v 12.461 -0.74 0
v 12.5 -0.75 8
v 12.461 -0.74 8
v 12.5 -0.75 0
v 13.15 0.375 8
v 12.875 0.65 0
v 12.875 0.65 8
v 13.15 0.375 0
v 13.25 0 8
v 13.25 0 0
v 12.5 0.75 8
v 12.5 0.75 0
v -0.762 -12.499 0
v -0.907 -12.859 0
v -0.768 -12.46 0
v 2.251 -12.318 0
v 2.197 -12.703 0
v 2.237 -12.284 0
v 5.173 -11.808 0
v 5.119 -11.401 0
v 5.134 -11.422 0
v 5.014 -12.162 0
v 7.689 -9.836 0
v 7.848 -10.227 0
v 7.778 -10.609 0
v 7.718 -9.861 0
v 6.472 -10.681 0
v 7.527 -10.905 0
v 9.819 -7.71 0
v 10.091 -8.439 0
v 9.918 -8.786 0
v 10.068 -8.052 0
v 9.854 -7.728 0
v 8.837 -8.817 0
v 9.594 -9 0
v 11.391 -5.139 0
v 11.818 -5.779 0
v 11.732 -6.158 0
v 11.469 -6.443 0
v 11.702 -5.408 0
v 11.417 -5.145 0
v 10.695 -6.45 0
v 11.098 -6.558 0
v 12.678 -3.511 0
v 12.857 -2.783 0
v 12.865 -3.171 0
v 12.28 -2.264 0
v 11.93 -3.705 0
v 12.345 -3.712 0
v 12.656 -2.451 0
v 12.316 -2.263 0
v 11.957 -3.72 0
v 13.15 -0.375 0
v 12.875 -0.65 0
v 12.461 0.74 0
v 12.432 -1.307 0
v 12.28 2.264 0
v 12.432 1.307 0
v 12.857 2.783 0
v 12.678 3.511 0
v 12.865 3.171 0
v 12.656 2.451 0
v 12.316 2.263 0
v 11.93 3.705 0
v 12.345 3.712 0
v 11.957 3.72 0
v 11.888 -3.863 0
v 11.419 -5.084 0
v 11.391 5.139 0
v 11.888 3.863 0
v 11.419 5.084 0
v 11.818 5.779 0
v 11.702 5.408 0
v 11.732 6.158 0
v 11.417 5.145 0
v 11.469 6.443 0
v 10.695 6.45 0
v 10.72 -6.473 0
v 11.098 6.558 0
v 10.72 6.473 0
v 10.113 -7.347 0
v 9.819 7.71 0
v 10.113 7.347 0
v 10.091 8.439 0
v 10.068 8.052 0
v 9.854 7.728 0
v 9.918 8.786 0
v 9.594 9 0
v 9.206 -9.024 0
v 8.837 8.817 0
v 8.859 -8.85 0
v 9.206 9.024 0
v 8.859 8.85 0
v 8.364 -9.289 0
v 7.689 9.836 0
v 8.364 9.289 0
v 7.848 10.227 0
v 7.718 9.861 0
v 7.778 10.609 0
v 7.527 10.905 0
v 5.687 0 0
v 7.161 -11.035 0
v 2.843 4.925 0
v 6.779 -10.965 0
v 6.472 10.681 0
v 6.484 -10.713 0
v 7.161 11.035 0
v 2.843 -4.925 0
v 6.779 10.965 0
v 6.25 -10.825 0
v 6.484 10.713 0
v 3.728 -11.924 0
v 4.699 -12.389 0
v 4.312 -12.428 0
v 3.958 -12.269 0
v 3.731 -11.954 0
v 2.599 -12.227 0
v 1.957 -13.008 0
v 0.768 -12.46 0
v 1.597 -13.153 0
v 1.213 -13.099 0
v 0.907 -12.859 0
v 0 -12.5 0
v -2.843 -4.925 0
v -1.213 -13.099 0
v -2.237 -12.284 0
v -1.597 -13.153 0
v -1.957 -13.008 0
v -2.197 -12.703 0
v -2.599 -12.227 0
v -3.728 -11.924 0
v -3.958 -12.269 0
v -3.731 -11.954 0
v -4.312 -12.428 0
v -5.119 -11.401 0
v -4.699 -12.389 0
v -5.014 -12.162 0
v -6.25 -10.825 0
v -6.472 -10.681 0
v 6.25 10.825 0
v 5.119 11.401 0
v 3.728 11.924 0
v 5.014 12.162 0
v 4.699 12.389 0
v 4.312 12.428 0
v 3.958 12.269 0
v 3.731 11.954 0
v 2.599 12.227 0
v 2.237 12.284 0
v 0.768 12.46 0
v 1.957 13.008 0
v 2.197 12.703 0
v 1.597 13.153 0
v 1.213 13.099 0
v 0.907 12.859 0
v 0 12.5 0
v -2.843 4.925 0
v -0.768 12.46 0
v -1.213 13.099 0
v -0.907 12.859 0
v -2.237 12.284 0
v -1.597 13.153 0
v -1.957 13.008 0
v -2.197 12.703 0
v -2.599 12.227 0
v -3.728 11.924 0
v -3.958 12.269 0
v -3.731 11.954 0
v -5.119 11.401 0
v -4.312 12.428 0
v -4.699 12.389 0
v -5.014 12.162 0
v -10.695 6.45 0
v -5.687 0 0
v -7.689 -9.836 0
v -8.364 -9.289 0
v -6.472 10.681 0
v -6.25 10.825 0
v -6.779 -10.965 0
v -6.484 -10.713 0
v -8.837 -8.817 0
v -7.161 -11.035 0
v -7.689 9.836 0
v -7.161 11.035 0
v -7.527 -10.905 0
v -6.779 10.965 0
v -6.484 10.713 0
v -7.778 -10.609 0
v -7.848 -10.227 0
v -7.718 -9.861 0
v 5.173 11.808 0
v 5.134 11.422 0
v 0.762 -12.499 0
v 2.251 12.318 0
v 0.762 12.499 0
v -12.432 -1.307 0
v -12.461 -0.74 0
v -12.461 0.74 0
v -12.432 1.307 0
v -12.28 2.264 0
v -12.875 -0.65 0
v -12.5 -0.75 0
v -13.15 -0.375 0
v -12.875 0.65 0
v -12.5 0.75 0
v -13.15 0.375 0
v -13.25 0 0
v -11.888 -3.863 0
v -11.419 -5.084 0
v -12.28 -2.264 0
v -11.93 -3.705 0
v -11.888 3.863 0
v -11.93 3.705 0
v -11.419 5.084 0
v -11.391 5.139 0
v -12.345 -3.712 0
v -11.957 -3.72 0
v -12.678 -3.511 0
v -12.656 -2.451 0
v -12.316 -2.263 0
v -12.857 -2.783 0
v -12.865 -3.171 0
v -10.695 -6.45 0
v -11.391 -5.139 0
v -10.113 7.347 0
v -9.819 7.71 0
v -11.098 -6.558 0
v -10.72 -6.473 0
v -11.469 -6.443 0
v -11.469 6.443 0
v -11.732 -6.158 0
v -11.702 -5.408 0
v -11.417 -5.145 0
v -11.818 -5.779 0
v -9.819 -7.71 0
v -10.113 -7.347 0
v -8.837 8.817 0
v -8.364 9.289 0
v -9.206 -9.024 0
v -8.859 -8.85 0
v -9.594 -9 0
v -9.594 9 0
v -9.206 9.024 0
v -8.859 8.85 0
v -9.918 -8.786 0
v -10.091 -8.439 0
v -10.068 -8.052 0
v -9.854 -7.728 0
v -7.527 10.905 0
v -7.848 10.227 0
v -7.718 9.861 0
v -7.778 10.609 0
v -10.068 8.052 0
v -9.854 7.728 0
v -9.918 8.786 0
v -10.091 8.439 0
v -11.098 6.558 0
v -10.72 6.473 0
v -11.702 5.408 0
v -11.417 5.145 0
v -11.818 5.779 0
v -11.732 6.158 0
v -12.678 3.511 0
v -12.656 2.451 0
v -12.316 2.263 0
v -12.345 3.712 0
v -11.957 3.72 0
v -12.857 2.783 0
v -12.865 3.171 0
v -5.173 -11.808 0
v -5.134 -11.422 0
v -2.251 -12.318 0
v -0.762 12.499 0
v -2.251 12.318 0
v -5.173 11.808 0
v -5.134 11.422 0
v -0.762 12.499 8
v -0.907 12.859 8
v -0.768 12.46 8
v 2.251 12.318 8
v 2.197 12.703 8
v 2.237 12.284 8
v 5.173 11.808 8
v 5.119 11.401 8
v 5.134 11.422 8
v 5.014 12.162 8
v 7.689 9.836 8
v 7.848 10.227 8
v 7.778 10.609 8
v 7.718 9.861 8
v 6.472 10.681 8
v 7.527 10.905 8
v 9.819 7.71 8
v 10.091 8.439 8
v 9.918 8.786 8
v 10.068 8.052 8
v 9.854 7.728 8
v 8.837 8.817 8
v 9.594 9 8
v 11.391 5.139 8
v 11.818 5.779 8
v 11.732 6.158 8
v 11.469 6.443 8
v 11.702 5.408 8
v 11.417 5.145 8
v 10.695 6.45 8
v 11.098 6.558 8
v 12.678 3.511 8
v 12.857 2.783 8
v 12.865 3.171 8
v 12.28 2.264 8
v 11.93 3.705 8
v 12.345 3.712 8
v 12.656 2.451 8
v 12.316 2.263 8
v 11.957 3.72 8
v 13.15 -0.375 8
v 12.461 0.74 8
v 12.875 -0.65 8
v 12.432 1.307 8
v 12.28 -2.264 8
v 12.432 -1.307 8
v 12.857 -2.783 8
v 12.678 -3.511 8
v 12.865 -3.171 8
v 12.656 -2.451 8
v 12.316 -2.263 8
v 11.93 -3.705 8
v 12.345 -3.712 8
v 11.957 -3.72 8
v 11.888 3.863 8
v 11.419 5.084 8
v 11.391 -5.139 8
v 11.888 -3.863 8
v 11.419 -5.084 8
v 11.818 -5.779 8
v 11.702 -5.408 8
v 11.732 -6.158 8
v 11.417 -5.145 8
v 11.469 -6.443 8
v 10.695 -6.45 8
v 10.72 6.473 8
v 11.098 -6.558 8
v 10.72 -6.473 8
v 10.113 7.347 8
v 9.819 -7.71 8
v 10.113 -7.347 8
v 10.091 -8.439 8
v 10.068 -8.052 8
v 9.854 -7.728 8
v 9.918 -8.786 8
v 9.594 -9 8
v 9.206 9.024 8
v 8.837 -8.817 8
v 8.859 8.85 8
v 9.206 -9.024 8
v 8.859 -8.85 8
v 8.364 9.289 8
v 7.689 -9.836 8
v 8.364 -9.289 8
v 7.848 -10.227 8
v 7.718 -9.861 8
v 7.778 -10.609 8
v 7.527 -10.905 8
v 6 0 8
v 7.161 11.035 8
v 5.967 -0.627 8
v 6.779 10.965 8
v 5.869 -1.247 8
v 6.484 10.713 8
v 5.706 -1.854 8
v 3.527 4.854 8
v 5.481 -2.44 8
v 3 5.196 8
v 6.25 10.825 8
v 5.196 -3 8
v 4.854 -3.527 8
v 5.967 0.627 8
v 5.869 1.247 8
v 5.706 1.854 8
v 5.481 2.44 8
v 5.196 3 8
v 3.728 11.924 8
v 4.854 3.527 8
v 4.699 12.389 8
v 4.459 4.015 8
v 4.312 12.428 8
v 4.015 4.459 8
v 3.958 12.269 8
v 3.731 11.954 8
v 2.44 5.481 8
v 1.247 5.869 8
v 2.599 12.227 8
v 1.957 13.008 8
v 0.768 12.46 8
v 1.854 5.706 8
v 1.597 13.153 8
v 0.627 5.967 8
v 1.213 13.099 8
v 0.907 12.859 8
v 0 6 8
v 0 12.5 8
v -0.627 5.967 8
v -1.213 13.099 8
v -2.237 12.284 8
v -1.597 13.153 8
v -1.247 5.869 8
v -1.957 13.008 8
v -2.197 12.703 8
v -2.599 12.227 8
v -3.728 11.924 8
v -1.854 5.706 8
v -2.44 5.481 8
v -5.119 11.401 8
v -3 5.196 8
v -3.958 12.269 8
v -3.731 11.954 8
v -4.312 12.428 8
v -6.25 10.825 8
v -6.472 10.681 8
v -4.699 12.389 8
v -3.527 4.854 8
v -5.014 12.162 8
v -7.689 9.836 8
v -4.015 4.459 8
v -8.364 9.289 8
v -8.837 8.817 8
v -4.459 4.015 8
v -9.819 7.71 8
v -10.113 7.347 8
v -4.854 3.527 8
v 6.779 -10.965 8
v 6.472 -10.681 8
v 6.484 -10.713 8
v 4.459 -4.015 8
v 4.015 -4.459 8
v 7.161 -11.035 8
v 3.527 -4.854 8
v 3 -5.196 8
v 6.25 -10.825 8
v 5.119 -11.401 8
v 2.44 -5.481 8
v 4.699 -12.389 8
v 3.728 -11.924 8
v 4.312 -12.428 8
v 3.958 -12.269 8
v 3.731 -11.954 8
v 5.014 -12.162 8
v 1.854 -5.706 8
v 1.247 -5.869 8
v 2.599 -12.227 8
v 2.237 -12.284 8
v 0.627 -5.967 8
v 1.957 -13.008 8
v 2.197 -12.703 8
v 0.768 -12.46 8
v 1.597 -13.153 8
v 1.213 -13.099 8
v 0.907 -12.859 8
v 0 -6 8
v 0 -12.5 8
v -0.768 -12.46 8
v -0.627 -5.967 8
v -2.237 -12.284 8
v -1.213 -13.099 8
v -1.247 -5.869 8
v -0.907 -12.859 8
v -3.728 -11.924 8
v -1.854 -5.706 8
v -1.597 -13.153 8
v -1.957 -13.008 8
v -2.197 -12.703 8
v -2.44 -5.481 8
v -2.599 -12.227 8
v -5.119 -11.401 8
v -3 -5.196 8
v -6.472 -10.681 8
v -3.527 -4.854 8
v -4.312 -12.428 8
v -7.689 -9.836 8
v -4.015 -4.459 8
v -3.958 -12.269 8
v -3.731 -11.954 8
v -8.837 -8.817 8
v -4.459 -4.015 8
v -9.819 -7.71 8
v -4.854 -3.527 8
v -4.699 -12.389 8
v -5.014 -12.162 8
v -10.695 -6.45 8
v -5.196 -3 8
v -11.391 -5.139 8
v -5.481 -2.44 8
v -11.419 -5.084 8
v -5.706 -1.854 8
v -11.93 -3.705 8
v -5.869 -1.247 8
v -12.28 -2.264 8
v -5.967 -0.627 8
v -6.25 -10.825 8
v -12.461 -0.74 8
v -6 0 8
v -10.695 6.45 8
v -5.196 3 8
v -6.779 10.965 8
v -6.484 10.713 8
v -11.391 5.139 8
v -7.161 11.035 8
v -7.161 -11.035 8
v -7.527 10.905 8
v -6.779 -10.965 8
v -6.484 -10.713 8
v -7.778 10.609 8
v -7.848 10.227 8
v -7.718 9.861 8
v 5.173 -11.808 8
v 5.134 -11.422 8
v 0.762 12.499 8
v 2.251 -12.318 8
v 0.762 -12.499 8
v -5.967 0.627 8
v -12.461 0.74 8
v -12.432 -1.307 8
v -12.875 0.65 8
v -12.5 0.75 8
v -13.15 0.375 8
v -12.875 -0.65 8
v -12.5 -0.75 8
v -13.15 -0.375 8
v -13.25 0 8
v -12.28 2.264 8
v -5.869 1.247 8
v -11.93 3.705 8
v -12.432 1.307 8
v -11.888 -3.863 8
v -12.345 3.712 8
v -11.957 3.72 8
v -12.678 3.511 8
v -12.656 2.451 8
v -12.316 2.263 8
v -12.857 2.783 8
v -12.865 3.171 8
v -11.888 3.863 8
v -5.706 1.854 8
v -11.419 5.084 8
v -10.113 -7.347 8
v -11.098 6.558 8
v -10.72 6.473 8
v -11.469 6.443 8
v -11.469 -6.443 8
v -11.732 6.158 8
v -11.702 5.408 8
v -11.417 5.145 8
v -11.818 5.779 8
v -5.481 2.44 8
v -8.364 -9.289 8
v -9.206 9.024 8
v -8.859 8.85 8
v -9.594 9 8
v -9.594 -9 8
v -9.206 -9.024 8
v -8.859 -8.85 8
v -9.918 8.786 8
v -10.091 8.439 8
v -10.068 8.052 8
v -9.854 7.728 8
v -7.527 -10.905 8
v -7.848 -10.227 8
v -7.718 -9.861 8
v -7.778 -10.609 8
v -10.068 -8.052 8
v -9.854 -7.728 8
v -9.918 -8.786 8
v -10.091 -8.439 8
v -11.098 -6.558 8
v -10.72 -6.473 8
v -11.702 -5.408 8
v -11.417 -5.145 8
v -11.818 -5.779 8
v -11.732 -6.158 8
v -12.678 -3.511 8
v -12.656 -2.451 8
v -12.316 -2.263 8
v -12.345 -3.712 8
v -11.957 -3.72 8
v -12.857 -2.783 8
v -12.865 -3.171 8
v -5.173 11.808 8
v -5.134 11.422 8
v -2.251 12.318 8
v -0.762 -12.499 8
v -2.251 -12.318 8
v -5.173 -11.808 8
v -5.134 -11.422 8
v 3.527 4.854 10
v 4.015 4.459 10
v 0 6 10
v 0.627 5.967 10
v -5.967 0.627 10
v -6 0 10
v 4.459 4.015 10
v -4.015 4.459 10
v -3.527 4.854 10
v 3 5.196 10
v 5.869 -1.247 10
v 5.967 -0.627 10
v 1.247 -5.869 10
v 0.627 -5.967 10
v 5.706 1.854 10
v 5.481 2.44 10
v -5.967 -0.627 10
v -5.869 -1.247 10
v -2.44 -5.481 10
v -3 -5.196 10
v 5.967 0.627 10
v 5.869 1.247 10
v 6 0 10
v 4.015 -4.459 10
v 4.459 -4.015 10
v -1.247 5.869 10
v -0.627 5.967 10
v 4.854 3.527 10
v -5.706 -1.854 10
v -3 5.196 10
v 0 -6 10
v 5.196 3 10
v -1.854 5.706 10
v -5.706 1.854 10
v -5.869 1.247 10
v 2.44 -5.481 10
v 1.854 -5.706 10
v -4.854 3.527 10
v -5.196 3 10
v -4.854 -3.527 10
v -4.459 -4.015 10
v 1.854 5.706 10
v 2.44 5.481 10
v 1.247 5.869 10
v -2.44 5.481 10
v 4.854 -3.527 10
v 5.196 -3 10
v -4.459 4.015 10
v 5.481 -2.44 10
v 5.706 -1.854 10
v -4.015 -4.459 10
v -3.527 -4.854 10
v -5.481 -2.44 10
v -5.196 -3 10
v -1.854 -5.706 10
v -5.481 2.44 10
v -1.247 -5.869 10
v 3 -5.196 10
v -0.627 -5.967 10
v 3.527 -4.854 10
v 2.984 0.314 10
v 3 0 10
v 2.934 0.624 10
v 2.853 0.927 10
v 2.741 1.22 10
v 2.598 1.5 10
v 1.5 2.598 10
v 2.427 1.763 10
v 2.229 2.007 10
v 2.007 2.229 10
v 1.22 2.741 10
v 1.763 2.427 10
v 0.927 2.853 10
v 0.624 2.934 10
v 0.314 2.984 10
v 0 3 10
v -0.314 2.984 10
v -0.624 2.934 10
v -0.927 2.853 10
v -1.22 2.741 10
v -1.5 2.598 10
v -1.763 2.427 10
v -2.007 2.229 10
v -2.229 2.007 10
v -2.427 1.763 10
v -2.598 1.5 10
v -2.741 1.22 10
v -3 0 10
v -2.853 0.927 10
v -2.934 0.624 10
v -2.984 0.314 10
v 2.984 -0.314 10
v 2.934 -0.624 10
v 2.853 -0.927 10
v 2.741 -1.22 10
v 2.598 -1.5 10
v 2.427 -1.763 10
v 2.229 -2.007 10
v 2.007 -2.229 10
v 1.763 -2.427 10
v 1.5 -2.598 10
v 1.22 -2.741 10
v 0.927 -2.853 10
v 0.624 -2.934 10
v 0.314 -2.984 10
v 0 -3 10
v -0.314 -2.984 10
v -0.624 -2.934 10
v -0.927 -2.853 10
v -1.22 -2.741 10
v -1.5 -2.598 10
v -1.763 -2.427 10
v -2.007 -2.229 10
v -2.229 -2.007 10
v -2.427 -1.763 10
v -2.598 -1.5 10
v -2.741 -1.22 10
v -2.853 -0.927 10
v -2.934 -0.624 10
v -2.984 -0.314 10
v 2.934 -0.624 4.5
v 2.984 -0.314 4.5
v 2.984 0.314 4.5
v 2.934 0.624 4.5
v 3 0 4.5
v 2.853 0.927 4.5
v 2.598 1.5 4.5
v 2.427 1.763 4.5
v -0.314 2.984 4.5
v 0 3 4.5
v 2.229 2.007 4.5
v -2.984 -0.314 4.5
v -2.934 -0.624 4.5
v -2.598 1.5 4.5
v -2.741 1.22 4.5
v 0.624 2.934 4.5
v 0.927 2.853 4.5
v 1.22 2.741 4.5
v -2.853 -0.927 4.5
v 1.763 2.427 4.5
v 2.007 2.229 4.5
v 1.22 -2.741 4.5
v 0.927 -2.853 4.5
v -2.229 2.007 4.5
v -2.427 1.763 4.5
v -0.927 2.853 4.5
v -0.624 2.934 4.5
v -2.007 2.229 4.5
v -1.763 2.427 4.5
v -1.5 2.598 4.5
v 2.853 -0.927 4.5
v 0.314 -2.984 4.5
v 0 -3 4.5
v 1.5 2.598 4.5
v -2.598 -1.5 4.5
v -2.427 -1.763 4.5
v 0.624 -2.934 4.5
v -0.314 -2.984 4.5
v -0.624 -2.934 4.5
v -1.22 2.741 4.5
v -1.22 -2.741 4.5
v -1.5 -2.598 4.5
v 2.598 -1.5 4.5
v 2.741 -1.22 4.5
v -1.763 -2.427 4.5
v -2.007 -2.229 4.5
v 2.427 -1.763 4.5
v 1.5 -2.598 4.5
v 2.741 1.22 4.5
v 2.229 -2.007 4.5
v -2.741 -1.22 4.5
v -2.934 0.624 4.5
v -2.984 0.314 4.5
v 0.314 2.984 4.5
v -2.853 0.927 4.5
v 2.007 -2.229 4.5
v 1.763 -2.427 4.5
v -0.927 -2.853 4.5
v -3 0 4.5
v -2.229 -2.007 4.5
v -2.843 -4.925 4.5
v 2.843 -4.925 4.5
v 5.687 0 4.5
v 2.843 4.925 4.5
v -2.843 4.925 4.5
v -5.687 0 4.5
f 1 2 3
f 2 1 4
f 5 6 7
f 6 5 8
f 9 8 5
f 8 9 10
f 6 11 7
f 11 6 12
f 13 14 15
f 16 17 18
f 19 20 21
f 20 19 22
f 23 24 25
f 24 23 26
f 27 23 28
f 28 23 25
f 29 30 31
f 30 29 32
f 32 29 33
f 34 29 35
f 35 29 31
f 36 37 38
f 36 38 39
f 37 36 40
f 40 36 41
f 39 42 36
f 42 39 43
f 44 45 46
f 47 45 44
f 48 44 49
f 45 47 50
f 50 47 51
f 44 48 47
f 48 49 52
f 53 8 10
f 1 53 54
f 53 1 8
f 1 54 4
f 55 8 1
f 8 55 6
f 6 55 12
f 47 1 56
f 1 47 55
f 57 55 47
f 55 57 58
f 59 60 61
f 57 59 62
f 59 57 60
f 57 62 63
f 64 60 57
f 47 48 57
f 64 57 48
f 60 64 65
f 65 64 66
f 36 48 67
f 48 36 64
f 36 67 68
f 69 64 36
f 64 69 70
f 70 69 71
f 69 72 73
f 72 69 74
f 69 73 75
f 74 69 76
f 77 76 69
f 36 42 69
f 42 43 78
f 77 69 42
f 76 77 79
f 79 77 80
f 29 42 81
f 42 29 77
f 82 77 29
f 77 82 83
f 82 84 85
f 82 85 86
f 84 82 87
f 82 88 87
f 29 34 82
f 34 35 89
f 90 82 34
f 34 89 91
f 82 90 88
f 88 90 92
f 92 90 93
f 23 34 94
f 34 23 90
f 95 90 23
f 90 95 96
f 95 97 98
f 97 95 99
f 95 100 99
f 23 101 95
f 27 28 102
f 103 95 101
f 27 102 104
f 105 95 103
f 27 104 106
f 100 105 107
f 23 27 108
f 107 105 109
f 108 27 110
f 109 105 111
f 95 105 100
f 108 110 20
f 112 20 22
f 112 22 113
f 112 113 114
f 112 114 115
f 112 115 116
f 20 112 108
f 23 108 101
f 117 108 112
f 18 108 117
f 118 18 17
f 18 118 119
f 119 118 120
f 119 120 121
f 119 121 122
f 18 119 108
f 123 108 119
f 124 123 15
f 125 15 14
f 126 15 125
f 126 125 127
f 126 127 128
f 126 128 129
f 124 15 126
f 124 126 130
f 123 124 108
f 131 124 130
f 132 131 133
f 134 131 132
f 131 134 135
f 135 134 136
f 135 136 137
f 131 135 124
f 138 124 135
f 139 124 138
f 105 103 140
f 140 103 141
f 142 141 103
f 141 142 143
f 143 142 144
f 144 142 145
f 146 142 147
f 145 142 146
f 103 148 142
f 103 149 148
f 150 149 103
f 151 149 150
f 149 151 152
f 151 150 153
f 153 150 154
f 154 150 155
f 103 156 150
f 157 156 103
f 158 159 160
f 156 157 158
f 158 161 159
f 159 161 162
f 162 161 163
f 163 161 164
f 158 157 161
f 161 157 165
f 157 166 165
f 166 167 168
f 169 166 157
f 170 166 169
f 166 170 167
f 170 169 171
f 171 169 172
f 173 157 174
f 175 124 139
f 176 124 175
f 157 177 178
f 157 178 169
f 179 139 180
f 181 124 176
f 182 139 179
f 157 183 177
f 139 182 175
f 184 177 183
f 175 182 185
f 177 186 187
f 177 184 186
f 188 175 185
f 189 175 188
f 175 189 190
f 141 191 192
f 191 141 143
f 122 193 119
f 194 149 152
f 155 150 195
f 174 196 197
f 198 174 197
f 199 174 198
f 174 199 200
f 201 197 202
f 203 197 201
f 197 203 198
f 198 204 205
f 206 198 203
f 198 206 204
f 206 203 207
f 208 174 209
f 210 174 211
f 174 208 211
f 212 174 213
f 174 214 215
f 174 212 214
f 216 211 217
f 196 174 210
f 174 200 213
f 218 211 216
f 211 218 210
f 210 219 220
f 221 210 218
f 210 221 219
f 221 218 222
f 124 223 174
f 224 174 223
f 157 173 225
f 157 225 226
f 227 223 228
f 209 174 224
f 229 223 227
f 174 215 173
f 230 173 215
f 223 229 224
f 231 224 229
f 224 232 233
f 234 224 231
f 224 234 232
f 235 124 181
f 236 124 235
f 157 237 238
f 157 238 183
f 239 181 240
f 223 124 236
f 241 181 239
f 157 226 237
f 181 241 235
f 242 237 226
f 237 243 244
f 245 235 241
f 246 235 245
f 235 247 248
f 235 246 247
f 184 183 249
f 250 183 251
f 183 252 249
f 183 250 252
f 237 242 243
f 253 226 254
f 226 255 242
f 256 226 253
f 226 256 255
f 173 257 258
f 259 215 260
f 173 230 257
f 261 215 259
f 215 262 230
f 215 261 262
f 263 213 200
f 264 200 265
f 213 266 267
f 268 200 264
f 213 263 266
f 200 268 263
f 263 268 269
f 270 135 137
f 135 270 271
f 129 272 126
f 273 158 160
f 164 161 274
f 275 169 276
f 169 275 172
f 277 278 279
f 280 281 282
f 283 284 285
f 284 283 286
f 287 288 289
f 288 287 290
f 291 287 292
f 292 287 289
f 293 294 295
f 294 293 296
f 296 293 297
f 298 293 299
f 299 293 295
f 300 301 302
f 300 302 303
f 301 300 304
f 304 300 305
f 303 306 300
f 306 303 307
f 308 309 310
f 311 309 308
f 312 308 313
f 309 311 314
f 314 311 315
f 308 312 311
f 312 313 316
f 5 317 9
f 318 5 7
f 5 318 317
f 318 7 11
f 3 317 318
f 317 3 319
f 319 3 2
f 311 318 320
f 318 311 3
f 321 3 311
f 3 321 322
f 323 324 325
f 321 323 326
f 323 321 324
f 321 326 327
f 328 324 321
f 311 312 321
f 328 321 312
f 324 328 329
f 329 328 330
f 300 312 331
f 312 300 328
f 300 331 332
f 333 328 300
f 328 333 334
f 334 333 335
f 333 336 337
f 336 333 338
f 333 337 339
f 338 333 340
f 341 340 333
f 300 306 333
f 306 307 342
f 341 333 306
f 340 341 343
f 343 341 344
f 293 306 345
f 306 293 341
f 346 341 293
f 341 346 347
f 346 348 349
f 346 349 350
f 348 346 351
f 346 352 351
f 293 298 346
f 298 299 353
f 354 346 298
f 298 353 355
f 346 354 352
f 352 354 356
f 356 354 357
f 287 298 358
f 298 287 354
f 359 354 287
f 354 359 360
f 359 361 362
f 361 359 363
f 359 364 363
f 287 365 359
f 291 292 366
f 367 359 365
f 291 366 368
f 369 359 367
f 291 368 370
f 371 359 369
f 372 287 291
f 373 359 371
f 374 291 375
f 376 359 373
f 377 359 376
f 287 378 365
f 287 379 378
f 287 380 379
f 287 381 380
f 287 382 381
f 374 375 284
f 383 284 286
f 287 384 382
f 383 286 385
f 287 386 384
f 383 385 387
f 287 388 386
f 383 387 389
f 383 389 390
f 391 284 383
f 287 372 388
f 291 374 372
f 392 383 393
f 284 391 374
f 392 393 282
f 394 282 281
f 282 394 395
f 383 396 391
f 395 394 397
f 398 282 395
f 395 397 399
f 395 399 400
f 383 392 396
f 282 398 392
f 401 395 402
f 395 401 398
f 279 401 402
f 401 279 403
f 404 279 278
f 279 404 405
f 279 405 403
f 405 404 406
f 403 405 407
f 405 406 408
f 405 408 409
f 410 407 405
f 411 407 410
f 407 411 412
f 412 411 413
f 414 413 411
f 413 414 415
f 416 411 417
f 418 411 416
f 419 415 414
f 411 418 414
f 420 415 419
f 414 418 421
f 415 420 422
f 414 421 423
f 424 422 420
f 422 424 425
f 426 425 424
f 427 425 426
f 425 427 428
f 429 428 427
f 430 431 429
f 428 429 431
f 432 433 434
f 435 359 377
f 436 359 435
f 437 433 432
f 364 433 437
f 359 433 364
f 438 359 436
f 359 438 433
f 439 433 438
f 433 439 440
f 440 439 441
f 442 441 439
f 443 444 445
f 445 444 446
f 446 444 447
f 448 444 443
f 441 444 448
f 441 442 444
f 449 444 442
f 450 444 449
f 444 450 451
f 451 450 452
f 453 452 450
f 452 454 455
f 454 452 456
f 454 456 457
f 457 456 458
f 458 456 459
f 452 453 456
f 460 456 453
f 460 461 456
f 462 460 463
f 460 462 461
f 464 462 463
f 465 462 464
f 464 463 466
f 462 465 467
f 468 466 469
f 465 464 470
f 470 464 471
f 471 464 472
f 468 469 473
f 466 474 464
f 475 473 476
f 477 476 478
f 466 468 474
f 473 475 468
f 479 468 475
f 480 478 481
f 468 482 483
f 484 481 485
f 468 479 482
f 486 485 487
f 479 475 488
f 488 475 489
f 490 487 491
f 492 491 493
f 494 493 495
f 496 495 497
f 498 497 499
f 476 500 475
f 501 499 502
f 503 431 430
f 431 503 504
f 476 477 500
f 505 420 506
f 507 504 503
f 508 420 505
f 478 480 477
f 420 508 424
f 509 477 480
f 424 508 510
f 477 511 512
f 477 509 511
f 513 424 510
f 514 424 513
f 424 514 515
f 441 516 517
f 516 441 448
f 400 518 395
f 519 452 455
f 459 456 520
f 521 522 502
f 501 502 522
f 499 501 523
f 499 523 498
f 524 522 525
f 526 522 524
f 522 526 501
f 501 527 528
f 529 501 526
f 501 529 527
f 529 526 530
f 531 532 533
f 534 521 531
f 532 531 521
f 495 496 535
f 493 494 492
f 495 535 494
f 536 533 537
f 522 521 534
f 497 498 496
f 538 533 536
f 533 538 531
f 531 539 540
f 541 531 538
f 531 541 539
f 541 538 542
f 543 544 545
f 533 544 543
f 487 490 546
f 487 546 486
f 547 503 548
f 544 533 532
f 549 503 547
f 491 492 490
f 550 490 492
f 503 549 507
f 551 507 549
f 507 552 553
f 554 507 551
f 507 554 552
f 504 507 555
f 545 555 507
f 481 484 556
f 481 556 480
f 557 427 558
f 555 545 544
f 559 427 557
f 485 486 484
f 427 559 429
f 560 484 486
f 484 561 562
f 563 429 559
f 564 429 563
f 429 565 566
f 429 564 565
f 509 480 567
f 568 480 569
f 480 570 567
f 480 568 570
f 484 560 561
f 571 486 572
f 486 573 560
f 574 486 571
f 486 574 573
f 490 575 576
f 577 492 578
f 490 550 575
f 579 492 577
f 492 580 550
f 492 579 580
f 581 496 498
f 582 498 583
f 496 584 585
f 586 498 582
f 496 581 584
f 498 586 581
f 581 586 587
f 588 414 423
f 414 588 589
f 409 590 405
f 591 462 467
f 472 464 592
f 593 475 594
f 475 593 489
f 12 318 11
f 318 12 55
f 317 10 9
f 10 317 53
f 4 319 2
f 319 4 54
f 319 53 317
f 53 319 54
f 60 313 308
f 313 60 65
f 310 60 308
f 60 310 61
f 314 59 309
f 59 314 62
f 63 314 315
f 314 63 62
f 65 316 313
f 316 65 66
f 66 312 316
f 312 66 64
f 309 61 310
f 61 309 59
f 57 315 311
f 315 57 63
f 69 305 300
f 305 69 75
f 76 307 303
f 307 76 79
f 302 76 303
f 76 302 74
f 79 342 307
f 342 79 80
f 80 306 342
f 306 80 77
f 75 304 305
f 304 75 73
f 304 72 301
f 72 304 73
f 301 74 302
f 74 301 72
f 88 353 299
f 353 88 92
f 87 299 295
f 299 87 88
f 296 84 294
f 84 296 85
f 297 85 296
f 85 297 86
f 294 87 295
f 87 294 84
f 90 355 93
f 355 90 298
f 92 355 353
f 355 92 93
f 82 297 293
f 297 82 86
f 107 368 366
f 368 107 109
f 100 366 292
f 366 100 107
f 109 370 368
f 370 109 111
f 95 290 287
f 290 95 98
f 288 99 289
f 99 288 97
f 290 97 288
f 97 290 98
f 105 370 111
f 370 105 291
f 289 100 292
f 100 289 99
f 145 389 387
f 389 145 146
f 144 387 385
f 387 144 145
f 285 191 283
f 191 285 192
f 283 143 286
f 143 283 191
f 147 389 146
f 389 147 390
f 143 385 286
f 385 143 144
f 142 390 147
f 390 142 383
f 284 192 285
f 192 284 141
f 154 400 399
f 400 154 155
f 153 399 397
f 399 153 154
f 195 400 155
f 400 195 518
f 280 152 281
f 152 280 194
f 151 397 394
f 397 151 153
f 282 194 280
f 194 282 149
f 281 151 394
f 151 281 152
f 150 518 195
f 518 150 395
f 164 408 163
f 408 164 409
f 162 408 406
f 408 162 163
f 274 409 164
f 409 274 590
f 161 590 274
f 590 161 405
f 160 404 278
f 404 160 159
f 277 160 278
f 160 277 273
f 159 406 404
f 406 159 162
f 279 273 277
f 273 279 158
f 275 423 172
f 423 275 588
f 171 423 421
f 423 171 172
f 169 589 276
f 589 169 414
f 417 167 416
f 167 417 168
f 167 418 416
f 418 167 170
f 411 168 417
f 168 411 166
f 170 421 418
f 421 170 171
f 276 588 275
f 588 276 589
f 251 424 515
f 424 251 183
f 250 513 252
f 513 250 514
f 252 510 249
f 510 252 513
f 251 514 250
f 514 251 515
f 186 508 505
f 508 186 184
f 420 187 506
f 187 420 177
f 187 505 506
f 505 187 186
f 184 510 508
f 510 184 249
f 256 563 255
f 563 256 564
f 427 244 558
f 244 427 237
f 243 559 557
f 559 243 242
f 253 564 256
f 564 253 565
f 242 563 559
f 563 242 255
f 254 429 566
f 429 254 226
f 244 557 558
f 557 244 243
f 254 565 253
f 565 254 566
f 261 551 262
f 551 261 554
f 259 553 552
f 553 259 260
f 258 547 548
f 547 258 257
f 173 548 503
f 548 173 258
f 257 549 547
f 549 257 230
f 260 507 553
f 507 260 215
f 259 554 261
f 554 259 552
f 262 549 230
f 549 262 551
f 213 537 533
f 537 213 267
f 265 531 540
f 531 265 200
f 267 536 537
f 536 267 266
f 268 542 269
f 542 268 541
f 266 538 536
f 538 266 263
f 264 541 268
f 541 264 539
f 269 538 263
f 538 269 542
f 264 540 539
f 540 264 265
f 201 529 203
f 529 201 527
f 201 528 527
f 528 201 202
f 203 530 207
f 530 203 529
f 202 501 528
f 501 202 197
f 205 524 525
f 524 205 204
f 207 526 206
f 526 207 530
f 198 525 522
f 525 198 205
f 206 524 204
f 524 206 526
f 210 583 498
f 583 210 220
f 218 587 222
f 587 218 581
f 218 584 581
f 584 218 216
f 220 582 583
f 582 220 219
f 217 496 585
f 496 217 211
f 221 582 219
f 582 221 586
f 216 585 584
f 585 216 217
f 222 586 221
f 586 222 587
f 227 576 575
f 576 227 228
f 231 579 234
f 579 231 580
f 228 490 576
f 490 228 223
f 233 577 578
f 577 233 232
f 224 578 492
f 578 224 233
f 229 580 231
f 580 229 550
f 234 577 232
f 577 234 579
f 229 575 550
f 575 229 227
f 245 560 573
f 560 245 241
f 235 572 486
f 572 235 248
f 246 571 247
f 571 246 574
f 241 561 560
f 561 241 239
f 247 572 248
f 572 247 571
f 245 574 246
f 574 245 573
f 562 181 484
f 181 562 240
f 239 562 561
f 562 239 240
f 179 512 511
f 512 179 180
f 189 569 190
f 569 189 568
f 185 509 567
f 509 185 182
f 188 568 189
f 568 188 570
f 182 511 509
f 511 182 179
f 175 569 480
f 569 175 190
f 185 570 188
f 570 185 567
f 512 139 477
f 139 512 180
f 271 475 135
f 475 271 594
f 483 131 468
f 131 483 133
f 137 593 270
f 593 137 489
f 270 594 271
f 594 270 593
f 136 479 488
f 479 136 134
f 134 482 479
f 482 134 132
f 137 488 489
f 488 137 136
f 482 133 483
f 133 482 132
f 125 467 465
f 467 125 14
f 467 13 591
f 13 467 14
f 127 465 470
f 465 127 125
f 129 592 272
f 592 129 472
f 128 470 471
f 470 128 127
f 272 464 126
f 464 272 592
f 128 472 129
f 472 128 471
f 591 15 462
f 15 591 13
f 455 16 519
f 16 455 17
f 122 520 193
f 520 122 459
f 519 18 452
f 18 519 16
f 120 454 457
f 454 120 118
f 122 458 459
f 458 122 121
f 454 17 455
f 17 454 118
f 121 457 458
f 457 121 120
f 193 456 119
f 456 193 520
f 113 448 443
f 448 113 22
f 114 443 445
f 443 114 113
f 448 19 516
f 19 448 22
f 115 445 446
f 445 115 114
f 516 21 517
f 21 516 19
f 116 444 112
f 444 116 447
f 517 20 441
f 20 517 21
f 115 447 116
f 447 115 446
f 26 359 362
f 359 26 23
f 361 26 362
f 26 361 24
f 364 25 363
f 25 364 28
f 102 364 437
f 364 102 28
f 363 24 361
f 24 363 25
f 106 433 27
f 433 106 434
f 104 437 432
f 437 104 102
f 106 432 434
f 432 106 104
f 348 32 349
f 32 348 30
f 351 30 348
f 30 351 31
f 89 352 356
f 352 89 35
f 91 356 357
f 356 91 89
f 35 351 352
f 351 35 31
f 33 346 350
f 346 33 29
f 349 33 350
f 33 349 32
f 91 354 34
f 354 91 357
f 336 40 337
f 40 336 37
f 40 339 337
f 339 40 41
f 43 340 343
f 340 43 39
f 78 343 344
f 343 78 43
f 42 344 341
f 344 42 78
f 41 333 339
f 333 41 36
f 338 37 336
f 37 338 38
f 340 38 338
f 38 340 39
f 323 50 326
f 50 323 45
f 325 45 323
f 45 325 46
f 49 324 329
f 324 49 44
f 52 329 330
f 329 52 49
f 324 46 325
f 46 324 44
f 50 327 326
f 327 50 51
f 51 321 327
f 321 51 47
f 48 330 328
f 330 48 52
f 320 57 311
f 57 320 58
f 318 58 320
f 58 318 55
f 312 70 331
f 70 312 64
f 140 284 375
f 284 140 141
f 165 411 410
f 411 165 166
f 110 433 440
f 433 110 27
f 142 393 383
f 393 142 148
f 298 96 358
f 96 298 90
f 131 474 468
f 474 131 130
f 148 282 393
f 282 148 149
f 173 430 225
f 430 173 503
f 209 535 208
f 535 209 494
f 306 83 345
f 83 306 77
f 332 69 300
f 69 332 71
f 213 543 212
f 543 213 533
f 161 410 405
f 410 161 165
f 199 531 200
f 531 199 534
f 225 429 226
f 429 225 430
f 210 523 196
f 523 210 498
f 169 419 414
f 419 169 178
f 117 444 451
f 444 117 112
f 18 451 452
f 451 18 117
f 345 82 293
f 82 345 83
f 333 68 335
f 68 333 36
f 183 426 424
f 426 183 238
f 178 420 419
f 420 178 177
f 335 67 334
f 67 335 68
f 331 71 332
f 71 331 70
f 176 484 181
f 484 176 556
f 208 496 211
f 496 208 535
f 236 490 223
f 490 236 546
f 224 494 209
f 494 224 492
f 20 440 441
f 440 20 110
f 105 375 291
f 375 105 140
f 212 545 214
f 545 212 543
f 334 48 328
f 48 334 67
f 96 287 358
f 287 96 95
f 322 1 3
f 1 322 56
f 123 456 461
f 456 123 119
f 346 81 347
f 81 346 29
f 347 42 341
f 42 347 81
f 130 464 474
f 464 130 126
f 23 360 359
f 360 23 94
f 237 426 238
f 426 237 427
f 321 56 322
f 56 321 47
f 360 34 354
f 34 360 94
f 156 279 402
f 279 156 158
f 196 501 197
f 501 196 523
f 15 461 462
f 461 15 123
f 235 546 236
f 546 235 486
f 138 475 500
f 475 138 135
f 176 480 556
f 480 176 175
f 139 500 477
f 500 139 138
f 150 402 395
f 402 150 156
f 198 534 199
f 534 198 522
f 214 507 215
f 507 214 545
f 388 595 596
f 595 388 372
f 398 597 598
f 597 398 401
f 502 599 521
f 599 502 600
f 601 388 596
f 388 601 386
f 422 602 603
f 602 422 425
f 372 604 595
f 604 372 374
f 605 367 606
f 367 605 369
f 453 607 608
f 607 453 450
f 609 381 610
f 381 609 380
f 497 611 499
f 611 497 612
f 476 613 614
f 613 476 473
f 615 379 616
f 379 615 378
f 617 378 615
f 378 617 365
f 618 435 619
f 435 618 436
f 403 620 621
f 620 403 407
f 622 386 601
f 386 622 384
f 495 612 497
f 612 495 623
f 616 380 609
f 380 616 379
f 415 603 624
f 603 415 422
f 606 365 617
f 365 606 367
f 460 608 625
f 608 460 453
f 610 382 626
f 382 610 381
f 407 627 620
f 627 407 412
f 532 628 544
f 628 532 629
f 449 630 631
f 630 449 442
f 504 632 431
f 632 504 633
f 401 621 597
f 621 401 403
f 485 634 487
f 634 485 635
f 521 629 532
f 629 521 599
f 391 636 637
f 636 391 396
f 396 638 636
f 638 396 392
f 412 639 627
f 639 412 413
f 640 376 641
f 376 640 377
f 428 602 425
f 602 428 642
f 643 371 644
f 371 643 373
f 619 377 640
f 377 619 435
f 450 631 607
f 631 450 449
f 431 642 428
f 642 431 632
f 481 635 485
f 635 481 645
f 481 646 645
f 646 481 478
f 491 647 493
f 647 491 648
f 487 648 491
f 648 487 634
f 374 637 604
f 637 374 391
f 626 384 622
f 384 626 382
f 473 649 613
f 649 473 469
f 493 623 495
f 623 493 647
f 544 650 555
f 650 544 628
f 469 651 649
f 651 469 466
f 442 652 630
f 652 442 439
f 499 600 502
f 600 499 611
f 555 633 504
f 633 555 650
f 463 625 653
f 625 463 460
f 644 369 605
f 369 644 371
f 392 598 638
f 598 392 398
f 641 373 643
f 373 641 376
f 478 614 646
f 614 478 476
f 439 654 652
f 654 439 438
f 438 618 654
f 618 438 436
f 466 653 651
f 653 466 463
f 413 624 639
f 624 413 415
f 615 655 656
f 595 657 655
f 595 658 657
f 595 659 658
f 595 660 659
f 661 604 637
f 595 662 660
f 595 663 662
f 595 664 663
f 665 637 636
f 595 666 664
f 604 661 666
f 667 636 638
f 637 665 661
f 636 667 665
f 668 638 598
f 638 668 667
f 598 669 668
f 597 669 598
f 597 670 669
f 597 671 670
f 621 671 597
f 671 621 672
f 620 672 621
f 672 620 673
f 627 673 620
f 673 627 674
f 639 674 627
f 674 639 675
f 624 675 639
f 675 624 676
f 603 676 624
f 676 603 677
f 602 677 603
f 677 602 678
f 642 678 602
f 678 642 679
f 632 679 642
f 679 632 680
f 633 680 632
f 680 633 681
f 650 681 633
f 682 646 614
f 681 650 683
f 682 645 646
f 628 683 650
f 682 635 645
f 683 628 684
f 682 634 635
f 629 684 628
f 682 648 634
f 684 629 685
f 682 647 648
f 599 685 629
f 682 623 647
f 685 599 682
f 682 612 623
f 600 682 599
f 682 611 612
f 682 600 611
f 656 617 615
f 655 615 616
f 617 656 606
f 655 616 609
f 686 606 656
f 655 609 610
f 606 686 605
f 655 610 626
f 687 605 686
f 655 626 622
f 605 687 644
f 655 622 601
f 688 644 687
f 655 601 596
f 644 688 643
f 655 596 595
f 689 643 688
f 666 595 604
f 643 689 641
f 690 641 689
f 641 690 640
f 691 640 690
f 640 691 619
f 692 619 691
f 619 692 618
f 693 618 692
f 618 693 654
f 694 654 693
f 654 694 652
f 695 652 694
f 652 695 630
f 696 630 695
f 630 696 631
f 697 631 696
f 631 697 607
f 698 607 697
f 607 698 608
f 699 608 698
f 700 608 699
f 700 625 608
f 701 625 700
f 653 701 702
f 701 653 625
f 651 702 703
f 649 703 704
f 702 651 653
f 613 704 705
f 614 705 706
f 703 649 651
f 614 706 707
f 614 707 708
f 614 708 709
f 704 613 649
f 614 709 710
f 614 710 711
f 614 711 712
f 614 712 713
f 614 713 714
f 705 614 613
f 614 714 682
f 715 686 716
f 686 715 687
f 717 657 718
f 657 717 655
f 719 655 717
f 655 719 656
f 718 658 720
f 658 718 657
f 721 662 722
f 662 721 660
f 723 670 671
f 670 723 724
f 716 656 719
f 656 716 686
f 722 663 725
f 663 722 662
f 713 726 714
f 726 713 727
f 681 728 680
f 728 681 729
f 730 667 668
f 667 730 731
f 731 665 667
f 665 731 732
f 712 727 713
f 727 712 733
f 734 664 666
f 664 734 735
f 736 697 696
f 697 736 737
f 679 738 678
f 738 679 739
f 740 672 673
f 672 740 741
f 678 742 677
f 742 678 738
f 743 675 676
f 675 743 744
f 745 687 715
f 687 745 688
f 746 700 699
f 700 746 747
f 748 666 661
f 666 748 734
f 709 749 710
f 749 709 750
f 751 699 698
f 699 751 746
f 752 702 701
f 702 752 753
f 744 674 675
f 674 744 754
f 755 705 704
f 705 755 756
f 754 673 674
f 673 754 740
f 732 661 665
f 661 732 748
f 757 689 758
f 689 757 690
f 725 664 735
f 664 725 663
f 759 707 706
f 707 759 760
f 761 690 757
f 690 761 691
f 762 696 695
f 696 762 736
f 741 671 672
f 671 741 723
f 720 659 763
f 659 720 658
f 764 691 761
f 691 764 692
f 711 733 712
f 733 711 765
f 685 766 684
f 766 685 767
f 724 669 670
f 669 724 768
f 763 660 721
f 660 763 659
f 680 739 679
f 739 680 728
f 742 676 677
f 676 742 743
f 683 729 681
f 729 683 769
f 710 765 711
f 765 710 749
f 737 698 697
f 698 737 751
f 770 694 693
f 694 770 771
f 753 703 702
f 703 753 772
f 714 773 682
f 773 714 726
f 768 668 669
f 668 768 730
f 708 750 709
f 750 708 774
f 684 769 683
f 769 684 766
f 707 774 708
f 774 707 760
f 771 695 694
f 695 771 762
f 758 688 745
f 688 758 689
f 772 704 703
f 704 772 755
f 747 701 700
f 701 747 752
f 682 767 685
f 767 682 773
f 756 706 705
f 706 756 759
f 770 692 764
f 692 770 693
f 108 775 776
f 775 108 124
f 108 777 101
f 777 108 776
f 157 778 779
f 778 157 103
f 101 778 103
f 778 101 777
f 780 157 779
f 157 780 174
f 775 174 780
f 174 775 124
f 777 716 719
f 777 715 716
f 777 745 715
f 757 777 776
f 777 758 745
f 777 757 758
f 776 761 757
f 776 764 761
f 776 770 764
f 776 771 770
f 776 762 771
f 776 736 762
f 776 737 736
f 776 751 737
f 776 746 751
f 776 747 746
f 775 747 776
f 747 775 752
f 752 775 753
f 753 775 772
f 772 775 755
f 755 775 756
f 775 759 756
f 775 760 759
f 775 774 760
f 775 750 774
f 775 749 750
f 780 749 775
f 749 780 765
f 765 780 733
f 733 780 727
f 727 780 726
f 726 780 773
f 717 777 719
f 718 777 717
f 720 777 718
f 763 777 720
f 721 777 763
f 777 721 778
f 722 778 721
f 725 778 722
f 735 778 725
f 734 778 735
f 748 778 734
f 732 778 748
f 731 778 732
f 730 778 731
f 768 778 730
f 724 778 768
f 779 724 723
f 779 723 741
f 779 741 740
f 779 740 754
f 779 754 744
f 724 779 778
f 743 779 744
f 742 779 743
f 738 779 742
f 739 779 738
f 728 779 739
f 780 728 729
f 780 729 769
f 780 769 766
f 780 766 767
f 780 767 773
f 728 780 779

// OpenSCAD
/*
  Simple Parametric Knurled Knob with Spacer
*/

/* [Knob Settings] */
knob_diameter = 25.0;     // Overall diameter of the knob
knob_thickness = 8.0;     // Thickness of the knob

/* [Screw Configuration] */
shaft_diameter = 6.0;     // Diameter of the central screw shaft
head_diameter = 10.0;     // Distance across the flats of the hex head
head_depth = 4.5;         // How deep the hex hole goes into the knob

/* [Knurling Configuration] */
knurl_size = 1.5;         // Diameter of the grip ridges

/* [Spacer Configuration] */
spacer_thickness = 2.0;   // Height of the standoff spacer
spacer_diameter = 12.0;   // Diameter of the standoff spacer

/* [Hidden] */
$fn = 60;                 // Smoothness resolution for curves

// --- Generate Knob ---

difference() {
    
    // Step A: The main body, grip ridges, and spacer
    union() {
        // Main knob body
        cylinder(h = knob_thickness, d = knob_diameter);
        
        // Add the grip ridges mathematically evenly around the outside
        num_ridges = floor((PI * knob_diameter) / (knurl_size * 2));
        for(i = [0 : num_ridges - 1]) {
            rotate([0, 0, i * (360 / num_ridges)])
            translate([knob_diameter / 2, 0, 0])
            cylinder(h = knob_thickness, d = knurl_size, $fn = 12);
        }

        // Add the spacer/washer to the face where the shaft exits
        translate([0, 0, knob_thickness])
        cylinder(h = spacer_thickness, d = spacer_diameter);
    }

    // Step B: The central shaft hole (goes all the way through knob + spacer)
    translate([0, 0, -1])
    cylinder(h = knob_thickness + spacer_thickness + 2, d = shaft_diameter);

    // Step C: The press-fit hex hole 
    translate([0, 0, -0.1])
    cylinder(h = head_depth + 0.1, d = (head_diameter - 0.15) / cos(30), $fn = 6);
}
